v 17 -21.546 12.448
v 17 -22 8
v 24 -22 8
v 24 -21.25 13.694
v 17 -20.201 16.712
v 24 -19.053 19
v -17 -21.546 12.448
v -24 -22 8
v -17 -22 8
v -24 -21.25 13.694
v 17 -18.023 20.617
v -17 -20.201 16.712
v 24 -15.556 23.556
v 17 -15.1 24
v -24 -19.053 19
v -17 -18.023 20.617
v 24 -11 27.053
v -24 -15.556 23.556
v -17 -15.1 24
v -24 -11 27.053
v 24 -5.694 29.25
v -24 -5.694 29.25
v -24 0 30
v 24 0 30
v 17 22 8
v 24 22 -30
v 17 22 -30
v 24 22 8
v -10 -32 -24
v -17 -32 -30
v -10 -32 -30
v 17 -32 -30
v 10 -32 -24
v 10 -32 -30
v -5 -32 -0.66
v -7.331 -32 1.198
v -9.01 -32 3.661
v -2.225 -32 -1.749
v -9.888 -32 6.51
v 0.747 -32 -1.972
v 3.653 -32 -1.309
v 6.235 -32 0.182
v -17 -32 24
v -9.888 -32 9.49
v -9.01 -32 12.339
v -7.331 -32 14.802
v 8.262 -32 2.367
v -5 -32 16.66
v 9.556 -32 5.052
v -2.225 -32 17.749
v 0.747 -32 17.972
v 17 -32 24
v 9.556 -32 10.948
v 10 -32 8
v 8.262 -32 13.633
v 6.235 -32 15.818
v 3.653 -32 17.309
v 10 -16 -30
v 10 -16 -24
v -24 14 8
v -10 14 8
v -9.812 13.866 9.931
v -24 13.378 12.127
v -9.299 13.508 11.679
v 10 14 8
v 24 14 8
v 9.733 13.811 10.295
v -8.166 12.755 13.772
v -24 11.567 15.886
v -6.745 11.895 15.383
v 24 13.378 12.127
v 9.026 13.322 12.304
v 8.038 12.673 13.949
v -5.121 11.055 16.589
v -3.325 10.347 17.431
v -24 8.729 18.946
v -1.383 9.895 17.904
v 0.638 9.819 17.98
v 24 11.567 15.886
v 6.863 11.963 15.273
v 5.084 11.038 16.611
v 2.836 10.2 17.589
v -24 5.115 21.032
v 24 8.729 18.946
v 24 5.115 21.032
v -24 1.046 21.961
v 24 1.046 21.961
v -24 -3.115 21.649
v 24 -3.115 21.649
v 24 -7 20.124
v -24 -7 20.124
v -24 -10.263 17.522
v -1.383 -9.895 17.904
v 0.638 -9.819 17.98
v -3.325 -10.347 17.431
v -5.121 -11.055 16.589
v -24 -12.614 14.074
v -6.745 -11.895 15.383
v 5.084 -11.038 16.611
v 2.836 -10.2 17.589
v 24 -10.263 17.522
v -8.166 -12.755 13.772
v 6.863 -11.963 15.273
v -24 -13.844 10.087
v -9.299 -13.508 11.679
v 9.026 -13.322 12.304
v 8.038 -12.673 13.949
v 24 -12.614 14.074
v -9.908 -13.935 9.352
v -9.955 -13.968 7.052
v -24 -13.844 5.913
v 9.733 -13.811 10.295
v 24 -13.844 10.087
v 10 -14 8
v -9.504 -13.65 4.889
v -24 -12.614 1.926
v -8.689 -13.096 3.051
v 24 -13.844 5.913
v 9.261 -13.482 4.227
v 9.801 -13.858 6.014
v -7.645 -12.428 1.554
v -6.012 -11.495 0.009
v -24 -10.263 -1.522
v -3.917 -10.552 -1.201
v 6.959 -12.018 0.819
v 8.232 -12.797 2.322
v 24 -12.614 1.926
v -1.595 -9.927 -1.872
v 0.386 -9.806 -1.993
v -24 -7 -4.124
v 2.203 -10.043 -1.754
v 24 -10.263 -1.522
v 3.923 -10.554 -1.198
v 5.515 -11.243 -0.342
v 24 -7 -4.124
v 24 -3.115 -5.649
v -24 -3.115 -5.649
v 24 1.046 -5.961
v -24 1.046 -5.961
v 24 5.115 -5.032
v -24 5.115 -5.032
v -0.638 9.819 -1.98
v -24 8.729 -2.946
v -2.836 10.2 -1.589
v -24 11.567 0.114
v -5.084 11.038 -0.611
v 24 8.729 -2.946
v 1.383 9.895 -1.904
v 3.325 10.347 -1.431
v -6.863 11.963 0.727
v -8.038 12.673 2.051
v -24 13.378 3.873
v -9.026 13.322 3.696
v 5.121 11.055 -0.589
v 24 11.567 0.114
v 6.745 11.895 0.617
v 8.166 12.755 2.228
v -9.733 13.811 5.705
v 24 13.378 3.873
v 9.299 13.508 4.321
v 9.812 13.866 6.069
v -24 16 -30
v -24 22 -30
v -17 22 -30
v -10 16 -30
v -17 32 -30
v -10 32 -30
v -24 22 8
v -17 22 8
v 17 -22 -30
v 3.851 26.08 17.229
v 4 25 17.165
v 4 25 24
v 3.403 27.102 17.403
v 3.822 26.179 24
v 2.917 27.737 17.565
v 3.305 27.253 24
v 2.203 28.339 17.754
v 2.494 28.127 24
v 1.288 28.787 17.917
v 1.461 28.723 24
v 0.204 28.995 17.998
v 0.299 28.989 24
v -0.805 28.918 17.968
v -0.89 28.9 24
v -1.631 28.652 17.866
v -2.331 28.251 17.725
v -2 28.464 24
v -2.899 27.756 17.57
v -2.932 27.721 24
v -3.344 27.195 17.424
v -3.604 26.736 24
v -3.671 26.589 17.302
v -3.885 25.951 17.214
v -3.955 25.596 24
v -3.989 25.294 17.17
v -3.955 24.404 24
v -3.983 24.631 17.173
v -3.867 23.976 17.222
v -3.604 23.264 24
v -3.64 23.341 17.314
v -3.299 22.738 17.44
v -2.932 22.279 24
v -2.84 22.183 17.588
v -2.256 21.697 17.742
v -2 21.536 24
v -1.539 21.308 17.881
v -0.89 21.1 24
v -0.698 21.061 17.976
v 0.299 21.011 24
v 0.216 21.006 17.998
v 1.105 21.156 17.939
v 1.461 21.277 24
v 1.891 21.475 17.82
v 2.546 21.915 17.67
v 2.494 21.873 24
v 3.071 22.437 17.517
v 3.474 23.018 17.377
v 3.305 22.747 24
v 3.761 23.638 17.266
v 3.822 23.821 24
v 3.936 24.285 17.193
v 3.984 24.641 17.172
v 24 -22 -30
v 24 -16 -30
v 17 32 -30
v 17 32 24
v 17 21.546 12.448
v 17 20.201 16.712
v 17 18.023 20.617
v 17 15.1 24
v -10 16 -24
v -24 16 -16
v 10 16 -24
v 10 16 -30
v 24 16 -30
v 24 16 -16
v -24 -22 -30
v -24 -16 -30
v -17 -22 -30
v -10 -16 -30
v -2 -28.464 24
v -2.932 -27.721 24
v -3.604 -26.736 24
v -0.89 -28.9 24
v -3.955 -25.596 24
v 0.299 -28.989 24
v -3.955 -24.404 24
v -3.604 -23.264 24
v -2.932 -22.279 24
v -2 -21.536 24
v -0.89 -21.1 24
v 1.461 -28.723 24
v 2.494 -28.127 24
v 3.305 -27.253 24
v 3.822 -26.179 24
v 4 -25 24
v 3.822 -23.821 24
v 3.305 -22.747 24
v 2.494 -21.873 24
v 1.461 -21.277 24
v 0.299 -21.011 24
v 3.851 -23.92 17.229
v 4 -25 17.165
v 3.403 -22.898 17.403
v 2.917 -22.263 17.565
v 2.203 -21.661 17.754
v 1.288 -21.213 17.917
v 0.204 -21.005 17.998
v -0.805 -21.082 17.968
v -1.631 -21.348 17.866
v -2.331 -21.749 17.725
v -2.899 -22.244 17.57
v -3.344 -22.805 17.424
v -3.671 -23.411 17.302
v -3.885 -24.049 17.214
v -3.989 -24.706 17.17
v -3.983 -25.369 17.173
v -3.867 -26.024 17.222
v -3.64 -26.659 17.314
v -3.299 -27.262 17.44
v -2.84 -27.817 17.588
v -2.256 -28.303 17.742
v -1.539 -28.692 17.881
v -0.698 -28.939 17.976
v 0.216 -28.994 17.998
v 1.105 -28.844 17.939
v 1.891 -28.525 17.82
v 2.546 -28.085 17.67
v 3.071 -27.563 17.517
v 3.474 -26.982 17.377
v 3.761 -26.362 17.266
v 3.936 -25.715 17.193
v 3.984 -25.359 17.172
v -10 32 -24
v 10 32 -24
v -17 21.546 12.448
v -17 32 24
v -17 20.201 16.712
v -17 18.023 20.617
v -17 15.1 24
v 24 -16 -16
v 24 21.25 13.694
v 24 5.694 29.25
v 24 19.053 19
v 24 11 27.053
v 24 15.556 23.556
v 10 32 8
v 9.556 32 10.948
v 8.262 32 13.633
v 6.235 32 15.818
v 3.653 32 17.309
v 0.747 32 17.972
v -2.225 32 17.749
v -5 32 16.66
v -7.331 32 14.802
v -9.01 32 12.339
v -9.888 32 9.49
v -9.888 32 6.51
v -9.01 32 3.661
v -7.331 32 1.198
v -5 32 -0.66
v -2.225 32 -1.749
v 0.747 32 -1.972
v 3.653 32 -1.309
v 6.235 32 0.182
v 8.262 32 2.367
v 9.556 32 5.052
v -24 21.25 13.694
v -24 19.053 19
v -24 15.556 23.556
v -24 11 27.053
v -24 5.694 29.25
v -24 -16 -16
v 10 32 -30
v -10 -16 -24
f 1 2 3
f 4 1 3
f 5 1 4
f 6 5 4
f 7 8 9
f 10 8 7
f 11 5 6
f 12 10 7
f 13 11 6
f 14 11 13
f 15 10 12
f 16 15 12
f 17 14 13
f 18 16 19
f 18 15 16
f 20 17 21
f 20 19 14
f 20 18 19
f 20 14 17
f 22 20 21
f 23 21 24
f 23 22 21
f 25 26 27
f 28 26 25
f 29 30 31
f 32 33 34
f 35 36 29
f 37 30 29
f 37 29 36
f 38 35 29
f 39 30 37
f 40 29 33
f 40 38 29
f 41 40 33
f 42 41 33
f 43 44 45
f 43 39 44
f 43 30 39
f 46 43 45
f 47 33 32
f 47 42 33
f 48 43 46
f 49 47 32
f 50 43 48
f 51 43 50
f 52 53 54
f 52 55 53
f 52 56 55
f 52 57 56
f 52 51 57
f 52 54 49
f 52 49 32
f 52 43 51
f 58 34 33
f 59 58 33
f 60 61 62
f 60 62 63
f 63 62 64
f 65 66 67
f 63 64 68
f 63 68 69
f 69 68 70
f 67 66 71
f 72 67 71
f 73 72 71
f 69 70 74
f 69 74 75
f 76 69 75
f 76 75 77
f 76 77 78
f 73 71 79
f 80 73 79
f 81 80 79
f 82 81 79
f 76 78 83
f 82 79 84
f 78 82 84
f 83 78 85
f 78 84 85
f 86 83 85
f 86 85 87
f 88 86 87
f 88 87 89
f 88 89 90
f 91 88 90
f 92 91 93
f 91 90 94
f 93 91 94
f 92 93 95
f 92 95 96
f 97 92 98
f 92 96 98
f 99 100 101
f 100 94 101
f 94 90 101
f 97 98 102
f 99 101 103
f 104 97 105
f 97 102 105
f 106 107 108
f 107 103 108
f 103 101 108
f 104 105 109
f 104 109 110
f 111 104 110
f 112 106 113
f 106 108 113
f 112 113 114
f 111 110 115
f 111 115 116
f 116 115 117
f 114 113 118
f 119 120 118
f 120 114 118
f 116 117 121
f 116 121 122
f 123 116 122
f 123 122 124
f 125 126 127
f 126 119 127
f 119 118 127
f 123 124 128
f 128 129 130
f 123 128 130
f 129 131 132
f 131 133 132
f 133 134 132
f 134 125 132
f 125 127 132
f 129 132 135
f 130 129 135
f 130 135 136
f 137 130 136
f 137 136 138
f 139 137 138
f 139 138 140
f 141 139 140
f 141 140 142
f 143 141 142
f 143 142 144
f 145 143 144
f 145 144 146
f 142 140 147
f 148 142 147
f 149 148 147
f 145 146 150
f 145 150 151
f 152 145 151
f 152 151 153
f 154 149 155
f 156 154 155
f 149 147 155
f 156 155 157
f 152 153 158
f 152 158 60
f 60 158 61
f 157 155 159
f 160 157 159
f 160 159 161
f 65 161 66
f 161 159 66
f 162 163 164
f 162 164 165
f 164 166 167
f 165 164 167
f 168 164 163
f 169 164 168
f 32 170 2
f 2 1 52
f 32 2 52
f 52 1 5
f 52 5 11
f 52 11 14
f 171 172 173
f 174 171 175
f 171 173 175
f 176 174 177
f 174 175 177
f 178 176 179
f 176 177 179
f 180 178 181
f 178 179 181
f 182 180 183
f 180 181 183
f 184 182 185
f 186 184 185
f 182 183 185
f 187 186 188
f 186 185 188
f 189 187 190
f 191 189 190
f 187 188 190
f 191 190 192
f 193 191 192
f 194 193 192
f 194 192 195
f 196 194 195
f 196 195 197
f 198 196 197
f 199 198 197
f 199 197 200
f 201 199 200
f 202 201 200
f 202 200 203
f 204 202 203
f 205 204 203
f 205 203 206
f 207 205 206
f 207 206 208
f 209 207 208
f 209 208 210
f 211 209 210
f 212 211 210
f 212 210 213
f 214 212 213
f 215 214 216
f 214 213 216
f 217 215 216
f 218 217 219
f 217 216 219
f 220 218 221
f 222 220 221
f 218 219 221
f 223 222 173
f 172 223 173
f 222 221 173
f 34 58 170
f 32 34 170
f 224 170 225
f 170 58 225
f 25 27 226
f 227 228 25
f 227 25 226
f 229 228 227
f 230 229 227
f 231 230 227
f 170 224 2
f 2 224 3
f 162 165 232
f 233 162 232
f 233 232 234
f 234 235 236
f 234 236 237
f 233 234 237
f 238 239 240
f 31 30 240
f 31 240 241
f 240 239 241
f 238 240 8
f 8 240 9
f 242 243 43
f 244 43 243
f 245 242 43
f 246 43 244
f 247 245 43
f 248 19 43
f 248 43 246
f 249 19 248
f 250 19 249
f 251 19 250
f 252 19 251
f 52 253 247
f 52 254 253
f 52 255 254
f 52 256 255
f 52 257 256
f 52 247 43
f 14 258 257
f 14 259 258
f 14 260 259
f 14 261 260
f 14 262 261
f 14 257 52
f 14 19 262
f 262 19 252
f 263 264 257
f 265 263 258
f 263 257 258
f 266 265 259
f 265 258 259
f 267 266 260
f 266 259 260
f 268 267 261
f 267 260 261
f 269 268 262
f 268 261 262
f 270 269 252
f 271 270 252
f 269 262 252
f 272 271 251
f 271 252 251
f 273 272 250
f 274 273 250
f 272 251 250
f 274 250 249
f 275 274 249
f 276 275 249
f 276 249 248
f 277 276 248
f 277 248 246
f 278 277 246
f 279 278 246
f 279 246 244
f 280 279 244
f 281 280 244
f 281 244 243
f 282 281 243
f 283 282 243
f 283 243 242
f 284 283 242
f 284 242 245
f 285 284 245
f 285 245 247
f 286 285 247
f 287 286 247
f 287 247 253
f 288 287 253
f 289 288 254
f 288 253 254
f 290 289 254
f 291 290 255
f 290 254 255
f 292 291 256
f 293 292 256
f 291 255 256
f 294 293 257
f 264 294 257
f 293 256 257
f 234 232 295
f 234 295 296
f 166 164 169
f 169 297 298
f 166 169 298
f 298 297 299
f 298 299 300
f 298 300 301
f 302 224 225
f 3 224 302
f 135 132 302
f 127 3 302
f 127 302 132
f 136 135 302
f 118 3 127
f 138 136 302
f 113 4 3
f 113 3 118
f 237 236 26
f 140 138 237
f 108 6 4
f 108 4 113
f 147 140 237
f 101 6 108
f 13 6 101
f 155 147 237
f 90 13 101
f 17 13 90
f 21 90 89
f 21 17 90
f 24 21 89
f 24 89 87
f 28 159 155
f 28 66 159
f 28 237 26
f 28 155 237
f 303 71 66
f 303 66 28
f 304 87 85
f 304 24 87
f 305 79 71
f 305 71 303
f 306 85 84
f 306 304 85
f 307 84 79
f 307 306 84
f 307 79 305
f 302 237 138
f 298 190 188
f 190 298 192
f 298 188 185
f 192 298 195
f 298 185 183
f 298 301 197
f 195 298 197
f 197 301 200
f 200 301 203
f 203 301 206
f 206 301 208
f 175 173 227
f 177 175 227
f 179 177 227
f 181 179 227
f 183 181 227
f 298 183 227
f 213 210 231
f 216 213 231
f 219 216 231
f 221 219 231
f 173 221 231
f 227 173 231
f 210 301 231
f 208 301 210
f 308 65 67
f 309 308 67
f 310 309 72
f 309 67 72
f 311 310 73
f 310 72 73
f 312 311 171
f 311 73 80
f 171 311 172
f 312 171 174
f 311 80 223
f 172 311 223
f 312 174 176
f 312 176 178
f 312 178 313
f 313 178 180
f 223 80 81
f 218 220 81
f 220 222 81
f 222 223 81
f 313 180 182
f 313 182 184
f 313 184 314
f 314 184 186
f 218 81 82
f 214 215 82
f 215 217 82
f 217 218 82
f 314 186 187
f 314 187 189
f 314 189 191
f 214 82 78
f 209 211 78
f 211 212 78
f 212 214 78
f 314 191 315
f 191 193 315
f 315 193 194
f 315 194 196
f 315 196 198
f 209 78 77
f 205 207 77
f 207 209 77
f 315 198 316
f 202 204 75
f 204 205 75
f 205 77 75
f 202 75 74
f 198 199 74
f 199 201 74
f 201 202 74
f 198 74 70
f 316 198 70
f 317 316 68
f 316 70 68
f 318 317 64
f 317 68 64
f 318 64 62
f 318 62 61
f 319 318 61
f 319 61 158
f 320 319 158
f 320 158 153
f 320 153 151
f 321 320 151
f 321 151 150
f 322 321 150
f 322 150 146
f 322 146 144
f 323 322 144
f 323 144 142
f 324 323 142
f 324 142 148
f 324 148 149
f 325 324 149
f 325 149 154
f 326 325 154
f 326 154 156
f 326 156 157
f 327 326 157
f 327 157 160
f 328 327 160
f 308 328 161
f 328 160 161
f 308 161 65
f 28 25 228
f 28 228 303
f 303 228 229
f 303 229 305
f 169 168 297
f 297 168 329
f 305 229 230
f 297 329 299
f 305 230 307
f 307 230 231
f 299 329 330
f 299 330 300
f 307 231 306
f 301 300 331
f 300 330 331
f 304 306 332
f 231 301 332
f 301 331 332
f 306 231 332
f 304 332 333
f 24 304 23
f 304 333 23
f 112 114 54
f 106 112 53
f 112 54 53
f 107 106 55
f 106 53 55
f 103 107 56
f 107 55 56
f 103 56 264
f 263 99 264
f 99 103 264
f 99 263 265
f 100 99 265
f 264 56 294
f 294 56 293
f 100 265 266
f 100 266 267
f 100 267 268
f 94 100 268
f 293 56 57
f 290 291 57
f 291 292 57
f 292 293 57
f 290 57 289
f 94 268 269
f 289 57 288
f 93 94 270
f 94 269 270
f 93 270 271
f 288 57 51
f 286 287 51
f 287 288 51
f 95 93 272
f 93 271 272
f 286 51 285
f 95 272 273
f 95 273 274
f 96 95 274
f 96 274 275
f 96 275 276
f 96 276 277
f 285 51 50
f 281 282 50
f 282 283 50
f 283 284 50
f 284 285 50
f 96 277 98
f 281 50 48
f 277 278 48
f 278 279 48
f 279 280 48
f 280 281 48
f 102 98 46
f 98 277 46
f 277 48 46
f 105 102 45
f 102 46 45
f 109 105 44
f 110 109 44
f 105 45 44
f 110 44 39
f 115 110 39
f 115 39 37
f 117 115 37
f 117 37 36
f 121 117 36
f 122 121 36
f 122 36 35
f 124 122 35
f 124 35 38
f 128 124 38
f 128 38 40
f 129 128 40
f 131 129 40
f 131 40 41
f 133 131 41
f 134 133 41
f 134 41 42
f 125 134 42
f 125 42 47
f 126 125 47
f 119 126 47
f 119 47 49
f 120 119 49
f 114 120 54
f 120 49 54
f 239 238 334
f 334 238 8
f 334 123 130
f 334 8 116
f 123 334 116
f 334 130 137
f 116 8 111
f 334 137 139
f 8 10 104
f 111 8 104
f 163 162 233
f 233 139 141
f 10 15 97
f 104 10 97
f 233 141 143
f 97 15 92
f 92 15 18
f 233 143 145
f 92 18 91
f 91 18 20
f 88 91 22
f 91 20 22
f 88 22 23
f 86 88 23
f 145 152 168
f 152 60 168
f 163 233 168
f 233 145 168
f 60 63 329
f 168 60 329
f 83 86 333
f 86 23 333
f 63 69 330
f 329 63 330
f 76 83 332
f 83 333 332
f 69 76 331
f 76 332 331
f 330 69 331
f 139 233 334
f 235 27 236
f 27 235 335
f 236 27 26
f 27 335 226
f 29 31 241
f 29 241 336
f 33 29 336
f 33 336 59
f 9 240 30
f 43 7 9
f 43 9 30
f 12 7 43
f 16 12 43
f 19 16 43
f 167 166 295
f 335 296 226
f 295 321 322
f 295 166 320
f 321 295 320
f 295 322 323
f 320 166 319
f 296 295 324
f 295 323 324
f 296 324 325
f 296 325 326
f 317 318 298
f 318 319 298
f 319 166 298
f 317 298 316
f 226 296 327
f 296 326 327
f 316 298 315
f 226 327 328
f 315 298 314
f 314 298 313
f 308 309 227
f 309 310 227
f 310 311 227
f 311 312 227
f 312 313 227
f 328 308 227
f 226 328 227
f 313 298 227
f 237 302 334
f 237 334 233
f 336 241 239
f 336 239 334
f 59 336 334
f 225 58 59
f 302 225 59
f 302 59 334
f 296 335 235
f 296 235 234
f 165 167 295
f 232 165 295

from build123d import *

# Parameters (mm, degrees)
F0_W          = 44
F0_H          = 60
F1_DEPTH      = 24
F2_R          = 21.99999
F3_W          = 34
F3_H          = 54
F4_DEPTH      = 10
F4_DEPTH_BACK = 54
F5_R          = 14
F5_W          = 32
F5_H          = 14
F6_DEPTH      = 48.001
F8_R          = 10
F8_W          = 20
F8_H          = 6
F9_DEPTH      = 64.001
F7_R          = 4
F10_DEPTH     = 7.8348487101


# Not quite as in the source:
# - a fillet or chamfer is up to 0.001 mm smaller than in the source, because OpenCascade refuses the exact size


with BuildPart() as f1:
    # F0 (on Right) → F1 (new body, symmetric)
    with BuildSketch(Plane.YZ):
        Rectangle(F0_W, F0_H)
    extrude(amount=F1_DEPTH, both=True)

    # F2 (radius 22 in the source; OpenCascade refuses exactly that, so slightly less here)
    f2_edges = [f1.edges().sort_by_distance(p)[0] for p in [
        (0, -22, 30),
        (0, 22, 30),
    ]]
    fillet(f2_edges, radius=F2_R)

    # F3 (on face) → F4 (join, two sides)
    with BuildSketch(Plane.XZ.offset(22)) as f4_sk:
        with Locations((0, -3)):
            Rectangle(F3_W, F3_H)
    extrude(amount=F4_DEPTH)
    extrude(f4_sk.sketch, amount=-F4_DEPTH_BACK)

    # F5 (on face) → F6 (cut, through all)
    with BuildSketch(Plane.YZ.offset(24)):
        with Locations((0, 8)):
            Circle(F5_R)
        with Locations((0, -23)):
            Rectangle(F5_W, F5_H)
    extrude(amount=-F6_DEPTH, mode=Mode.SUBTRACT)

    # F8 (on face) → F9 (cut, through all)
    with BuildSketch(Plane.XZ.offset(32)):
        with Locations((0, 8)):
            Circle(F8_R)
        with Locations((0, -27)):
            Rectangle(F8_W, F8_H)
    extrude(amount=-F9_DEPTH, mode=Mode.SUBTRACT)

    # F7 (on face) → F10 (cut, up to face)
    with BuildSketch(Plane.XY.offset(24)):
        with Locations((0, -25)):
            Circle(F7_R)
        with Locations((0, 25)):
            Circle(F7_R)
    extrude(amount=-F10_DEPTH, mode=Mode.SUBTRACT)


solid = f1.part
